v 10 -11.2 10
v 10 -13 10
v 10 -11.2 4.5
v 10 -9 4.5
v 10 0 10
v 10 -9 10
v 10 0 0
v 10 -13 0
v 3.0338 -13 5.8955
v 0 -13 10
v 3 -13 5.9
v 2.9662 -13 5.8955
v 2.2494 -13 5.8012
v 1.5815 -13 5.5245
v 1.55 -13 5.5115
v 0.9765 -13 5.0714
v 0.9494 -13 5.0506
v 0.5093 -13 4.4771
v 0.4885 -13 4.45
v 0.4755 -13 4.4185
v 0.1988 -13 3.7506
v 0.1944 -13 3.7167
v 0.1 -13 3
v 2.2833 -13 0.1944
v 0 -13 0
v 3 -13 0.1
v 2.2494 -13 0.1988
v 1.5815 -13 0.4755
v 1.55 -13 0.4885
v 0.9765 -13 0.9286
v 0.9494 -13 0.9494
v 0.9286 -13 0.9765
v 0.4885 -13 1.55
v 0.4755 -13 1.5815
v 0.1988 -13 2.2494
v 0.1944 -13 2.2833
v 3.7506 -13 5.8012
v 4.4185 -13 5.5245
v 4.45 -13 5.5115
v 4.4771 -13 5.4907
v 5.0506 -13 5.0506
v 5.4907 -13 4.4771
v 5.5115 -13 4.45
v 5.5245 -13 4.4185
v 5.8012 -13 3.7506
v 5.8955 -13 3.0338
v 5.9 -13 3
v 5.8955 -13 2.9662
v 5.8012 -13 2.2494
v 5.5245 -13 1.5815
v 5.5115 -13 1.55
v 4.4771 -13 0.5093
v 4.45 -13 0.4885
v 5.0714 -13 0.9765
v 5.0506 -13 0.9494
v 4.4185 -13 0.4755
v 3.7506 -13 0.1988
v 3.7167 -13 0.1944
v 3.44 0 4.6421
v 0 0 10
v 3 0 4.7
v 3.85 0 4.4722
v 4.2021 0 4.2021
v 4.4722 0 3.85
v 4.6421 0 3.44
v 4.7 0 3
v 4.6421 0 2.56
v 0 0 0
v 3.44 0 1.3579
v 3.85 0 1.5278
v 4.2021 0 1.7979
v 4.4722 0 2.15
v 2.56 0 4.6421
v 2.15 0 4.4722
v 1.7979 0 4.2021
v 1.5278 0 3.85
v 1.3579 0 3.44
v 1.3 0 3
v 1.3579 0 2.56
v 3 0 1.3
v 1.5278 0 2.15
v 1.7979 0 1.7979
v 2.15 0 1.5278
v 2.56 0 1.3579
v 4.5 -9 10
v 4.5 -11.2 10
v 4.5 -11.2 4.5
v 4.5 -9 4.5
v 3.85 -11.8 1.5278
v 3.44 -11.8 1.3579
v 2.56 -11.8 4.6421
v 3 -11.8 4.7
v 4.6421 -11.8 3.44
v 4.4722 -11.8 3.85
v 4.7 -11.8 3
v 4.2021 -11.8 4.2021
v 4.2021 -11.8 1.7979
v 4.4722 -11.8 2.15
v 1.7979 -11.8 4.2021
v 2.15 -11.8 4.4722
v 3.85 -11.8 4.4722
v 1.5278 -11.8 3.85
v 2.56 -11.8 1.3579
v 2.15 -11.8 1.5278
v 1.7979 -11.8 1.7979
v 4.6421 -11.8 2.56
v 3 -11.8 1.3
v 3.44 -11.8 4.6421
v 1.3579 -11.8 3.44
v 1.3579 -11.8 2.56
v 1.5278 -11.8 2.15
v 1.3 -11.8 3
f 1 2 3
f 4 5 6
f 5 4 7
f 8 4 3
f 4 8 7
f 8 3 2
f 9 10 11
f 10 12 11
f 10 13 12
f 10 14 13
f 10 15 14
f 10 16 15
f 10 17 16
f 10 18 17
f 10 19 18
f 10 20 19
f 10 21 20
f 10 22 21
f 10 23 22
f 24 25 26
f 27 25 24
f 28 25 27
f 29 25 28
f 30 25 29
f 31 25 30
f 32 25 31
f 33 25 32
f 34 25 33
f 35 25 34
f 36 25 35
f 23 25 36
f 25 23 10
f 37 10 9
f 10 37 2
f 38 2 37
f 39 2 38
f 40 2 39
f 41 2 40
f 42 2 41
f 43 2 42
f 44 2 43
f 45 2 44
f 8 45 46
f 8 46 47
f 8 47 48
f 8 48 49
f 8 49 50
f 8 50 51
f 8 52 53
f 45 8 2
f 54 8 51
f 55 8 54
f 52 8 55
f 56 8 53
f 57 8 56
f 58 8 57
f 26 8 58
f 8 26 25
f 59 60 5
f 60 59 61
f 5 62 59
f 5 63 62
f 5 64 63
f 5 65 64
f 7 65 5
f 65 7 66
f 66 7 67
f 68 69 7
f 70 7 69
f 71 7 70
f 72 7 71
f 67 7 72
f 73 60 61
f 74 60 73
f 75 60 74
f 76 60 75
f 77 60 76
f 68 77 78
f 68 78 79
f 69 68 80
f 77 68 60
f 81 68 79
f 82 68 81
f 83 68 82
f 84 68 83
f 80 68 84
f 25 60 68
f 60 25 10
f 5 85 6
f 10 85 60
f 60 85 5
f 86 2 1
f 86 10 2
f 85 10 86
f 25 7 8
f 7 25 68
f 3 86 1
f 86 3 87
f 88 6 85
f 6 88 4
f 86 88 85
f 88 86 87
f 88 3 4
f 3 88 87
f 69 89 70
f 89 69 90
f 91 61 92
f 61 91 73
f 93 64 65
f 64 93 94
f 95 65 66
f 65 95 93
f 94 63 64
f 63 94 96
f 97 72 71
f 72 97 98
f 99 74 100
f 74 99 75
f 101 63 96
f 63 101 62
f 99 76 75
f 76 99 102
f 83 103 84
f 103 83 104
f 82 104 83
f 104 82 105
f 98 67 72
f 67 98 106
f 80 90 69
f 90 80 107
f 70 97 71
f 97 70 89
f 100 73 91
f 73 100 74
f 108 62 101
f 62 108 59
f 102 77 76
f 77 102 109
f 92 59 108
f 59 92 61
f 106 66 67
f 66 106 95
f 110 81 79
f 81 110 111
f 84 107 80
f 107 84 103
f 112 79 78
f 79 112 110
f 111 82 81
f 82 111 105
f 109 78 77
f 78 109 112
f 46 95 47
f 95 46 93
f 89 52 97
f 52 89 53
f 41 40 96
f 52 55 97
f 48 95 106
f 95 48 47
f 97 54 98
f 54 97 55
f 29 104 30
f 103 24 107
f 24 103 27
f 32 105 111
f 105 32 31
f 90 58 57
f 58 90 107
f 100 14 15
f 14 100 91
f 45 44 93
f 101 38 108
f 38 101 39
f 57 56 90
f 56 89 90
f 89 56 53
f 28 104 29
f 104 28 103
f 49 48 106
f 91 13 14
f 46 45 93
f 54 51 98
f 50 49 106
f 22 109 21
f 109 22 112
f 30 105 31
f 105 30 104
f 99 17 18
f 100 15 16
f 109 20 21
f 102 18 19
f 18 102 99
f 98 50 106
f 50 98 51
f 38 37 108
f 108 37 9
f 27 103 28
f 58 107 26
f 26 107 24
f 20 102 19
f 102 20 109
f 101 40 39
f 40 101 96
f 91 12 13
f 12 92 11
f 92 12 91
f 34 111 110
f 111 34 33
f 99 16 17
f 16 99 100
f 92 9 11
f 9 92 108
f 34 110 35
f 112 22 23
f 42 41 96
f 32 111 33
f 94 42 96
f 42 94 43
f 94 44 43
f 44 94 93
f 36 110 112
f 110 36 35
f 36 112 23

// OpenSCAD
// Discovery supporter 3D Design

// Copyright (c) 2014 by Jeremy Bennett <jeremy.bennett@embecosm.com>

// Licensed under a Creative Commons Attribution-ShareAlike 3.0 Unported
// License.

// You should have received a copy of the license along with this work.  If not,
// see <http://creativecommons.org/licenses/by-sa/3.0/>.

// -----------------------------------------------------------------------------

// The main block
module main_block () {
	union () {
 		translate (v = [0, 0, 5])
			cube (size = [18, 6, 10], center = true);
		translate (v = [18 / 2, 0, 13 / 2])
			cylinder (r = 3, h = 13, center = true, $fn = 24);
 		translate (v = [-18 / 2, 0, 13 / 2])
			cylinder (r = 3, h = 13, center = true, $fn = 24);
	}
}


// The support
module discovery_support () {
	difference () {
		// The main support
		translate (v = [10 / 2, 10 / 2, 13 / 2])
			cube (size = [10, 10, 13], center = true);
		// Slot for the board
		translate (v = [10 / 2 + 4.5, 10 / 2 + 4.5, 2.2 / 2 + 9])
			cube (size = [10, 10, 2.2], center = true);
		// Screw hole
		translate (v = [3, 3, 13 / 2])
			cylinder (r = 1.7, h = 13.2, center = true, $fn = 24);
		// Screw countersink
		translate (v = [3, 3, 13.1 - 1.3 / 2])
			cylinder (r1 = 1.7, r2 = 3, h = 1.3, center = true, $fn = 24);
	}
}

// Rotate for better printing
rotate (a = [90, 0, 0])
	discovery_support ();
